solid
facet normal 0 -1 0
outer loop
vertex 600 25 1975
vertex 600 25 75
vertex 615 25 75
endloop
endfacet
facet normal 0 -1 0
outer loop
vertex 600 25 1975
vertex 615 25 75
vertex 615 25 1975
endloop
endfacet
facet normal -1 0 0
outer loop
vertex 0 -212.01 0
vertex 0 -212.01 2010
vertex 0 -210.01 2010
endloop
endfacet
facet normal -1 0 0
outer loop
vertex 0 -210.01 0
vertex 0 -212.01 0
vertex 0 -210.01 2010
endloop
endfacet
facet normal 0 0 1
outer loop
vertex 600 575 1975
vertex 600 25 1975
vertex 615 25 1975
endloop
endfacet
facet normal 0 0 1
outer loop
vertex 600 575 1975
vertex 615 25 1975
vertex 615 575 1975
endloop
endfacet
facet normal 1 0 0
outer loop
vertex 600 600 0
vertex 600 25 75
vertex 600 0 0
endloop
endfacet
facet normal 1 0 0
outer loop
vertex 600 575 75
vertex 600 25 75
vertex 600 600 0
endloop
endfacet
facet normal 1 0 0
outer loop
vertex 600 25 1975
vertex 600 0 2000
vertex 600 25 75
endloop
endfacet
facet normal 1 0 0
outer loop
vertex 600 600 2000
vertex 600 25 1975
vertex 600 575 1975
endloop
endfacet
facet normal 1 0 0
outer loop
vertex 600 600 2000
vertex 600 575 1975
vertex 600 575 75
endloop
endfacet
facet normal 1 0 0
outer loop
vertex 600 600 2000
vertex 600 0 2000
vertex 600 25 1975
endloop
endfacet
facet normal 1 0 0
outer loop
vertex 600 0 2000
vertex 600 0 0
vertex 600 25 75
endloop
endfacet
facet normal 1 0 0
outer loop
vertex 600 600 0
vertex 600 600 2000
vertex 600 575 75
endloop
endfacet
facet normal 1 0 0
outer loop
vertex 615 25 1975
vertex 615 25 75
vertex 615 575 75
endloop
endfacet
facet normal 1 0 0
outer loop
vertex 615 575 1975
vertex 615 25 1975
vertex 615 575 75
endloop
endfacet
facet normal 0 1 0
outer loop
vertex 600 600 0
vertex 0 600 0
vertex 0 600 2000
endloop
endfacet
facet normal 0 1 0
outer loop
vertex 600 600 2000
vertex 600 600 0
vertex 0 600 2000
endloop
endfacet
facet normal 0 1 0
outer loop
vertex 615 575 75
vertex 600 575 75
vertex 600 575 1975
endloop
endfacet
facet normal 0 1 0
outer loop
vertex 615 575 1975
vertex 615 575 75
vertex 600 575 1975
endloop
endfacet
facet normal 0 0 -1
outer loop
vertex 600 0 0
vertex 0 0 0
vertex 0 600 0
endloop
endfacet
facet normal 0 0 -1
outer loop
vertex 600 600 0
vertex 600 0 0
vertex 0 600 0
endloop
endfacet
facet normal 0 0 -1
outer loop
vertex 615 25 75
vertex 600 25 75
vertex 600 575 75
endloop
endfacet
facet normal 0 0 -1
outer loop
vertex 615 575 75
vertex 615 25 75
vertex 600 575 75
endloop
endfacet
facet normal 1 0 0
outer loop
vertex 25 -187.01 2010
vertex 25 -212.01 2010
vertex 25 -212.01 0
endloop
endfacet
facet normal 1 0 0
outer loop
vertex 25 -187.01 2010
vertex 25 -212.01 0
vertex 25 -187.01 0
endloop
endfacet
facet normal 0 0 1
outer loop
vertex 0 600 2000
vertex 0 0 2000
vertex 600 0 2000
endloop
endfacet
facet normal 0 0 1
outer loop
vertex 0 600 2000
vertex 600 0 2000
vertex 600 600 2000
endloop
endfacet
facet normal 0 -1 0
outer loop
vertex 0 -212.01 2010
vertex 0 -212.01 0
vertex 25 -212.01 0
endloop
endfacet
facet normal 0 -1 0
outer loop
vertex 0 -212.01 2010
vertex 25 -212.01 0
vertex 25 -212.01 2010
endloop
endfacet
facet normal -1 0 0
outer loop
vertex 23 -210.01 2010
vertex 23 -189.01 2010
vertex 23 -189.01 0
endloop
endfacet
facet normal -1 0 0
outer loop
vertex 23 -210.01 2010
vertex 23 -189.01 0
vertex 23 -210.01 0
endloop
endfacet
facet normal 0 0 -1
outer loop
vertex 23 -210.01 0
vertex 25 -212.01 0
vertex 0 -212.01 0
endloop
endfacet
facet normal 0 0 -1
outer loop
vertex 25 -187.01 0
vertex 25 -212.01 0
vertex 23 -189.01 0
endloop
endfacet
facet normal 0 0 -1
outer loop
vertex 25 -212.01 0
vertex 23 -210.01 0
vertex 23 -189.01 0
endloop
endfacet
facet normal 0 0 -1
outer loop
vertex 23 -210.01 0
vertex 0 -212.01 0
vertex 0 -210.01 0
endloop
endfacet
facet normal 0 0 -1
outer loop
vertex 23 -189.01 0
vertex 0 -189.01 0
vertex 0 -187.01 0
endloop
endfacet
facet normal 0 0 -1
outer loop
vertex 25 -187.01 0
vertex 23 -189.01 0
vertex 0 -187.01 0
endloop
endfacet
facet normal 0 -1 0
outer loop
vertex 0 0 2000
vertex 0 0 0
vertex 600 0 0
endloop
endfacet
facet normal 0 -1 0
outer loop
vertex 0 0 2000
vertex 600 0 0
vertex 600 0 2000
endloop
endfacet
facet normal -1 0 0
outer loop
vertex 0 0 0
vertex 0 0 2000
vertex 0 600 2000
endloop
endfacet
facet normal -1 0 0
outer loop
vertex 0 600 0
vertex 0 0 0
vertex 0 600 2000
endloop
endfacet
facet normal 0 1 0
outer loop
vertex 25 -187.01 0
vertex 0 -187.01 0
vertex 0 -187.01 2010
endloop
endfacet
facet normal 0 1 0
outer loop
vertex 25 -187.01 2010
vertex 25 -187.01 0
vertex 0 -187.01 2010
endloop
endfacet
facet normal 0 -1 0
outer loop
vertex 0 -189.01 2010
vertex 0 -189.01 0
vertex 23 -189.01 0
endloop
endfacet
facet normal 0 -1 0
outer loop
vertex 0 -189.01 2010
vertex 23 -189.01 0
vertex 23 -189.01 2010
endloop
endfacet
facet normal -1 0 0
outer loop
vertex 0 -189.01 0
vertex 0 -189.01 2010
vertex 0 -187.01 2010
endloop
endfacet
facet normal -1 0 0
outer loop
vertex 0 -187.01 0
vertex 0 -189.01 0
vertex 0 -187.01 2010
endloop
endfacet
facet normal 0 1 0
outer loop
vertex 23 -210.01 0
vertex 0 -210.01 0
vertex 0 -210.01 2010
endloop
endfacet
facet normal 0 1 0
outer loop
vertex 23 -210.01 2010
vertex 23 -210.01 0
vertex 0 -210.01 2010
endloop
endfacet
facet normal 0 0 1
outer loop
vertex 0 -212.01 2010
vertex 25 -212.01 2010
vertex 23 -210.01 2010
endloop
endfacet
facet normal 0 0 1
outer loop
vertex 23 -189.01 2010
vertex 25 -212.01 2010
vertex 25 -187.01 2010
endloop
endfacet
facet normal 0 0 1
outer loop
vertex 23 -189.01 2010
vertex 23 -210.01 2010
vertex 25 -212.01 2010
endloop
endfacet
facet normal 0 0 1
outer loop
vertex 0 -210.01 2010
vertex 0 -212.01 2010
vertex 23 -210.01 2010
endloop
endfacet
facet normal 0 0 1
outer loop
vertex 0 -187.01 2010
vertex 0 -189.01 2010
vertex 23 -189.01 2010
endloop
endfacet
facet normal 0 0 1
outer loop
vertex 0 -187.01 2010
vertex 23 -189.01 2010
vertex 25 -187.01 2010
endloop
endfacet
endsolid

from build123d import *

# Parameters (mm, degrees)
F0_W     = 600
F0_H     = 2000
F1_DEPTH = 600
F2_W     = 550
F2_H     = 1900
F3_DEPTH = 15
F4_W     = 25
F4_H     = 2010
F5_DEPTH = 25
F6_W     = 21
F6_H     = 2010
F7_DEPTH = 23


with BuildPart() as f1:
    # F0 (on Right) → F1 (new body)
    with BuildSketch(Plane.YZ):
        with Locations((300, 1000)):
            Rectangle(F0_W, F0_H)
    extrude(amount=F1_DEPTH)

    # F2 (on face) → F3 (join)
    with BuildSketch(Plane.YZ.offset(600)):
        with Locations((300, 1025)):
            Rectangle(F2_W, F2_H)
    extrude(amount=F3_DEPTH)


with BuildPart() as f5:
    # F4 (on Right) → F5 (new body)
    with BuildSketch(Plane.YZ):
        with Locations((-199.5102200199, 1005)):
            Rectangle(F4_W, F4_H)
    extrude(amount=F5_DEPTH)

    # F6 (on face) → F7 (cut, through all)
    with BuildSketch(Plane(origin=(0, 0, 0), x_dir=(0, -1, 0), z_dir=(-1, 0, 0))):
        with Locations((199.5102200199, 1005)):
            Rectangle(F6_W, F6_H)
    extrude(amount=-F7_DEPTH, mode=Mode.SUBTRACT)


solid = Compound([f1.part, f5.part])
